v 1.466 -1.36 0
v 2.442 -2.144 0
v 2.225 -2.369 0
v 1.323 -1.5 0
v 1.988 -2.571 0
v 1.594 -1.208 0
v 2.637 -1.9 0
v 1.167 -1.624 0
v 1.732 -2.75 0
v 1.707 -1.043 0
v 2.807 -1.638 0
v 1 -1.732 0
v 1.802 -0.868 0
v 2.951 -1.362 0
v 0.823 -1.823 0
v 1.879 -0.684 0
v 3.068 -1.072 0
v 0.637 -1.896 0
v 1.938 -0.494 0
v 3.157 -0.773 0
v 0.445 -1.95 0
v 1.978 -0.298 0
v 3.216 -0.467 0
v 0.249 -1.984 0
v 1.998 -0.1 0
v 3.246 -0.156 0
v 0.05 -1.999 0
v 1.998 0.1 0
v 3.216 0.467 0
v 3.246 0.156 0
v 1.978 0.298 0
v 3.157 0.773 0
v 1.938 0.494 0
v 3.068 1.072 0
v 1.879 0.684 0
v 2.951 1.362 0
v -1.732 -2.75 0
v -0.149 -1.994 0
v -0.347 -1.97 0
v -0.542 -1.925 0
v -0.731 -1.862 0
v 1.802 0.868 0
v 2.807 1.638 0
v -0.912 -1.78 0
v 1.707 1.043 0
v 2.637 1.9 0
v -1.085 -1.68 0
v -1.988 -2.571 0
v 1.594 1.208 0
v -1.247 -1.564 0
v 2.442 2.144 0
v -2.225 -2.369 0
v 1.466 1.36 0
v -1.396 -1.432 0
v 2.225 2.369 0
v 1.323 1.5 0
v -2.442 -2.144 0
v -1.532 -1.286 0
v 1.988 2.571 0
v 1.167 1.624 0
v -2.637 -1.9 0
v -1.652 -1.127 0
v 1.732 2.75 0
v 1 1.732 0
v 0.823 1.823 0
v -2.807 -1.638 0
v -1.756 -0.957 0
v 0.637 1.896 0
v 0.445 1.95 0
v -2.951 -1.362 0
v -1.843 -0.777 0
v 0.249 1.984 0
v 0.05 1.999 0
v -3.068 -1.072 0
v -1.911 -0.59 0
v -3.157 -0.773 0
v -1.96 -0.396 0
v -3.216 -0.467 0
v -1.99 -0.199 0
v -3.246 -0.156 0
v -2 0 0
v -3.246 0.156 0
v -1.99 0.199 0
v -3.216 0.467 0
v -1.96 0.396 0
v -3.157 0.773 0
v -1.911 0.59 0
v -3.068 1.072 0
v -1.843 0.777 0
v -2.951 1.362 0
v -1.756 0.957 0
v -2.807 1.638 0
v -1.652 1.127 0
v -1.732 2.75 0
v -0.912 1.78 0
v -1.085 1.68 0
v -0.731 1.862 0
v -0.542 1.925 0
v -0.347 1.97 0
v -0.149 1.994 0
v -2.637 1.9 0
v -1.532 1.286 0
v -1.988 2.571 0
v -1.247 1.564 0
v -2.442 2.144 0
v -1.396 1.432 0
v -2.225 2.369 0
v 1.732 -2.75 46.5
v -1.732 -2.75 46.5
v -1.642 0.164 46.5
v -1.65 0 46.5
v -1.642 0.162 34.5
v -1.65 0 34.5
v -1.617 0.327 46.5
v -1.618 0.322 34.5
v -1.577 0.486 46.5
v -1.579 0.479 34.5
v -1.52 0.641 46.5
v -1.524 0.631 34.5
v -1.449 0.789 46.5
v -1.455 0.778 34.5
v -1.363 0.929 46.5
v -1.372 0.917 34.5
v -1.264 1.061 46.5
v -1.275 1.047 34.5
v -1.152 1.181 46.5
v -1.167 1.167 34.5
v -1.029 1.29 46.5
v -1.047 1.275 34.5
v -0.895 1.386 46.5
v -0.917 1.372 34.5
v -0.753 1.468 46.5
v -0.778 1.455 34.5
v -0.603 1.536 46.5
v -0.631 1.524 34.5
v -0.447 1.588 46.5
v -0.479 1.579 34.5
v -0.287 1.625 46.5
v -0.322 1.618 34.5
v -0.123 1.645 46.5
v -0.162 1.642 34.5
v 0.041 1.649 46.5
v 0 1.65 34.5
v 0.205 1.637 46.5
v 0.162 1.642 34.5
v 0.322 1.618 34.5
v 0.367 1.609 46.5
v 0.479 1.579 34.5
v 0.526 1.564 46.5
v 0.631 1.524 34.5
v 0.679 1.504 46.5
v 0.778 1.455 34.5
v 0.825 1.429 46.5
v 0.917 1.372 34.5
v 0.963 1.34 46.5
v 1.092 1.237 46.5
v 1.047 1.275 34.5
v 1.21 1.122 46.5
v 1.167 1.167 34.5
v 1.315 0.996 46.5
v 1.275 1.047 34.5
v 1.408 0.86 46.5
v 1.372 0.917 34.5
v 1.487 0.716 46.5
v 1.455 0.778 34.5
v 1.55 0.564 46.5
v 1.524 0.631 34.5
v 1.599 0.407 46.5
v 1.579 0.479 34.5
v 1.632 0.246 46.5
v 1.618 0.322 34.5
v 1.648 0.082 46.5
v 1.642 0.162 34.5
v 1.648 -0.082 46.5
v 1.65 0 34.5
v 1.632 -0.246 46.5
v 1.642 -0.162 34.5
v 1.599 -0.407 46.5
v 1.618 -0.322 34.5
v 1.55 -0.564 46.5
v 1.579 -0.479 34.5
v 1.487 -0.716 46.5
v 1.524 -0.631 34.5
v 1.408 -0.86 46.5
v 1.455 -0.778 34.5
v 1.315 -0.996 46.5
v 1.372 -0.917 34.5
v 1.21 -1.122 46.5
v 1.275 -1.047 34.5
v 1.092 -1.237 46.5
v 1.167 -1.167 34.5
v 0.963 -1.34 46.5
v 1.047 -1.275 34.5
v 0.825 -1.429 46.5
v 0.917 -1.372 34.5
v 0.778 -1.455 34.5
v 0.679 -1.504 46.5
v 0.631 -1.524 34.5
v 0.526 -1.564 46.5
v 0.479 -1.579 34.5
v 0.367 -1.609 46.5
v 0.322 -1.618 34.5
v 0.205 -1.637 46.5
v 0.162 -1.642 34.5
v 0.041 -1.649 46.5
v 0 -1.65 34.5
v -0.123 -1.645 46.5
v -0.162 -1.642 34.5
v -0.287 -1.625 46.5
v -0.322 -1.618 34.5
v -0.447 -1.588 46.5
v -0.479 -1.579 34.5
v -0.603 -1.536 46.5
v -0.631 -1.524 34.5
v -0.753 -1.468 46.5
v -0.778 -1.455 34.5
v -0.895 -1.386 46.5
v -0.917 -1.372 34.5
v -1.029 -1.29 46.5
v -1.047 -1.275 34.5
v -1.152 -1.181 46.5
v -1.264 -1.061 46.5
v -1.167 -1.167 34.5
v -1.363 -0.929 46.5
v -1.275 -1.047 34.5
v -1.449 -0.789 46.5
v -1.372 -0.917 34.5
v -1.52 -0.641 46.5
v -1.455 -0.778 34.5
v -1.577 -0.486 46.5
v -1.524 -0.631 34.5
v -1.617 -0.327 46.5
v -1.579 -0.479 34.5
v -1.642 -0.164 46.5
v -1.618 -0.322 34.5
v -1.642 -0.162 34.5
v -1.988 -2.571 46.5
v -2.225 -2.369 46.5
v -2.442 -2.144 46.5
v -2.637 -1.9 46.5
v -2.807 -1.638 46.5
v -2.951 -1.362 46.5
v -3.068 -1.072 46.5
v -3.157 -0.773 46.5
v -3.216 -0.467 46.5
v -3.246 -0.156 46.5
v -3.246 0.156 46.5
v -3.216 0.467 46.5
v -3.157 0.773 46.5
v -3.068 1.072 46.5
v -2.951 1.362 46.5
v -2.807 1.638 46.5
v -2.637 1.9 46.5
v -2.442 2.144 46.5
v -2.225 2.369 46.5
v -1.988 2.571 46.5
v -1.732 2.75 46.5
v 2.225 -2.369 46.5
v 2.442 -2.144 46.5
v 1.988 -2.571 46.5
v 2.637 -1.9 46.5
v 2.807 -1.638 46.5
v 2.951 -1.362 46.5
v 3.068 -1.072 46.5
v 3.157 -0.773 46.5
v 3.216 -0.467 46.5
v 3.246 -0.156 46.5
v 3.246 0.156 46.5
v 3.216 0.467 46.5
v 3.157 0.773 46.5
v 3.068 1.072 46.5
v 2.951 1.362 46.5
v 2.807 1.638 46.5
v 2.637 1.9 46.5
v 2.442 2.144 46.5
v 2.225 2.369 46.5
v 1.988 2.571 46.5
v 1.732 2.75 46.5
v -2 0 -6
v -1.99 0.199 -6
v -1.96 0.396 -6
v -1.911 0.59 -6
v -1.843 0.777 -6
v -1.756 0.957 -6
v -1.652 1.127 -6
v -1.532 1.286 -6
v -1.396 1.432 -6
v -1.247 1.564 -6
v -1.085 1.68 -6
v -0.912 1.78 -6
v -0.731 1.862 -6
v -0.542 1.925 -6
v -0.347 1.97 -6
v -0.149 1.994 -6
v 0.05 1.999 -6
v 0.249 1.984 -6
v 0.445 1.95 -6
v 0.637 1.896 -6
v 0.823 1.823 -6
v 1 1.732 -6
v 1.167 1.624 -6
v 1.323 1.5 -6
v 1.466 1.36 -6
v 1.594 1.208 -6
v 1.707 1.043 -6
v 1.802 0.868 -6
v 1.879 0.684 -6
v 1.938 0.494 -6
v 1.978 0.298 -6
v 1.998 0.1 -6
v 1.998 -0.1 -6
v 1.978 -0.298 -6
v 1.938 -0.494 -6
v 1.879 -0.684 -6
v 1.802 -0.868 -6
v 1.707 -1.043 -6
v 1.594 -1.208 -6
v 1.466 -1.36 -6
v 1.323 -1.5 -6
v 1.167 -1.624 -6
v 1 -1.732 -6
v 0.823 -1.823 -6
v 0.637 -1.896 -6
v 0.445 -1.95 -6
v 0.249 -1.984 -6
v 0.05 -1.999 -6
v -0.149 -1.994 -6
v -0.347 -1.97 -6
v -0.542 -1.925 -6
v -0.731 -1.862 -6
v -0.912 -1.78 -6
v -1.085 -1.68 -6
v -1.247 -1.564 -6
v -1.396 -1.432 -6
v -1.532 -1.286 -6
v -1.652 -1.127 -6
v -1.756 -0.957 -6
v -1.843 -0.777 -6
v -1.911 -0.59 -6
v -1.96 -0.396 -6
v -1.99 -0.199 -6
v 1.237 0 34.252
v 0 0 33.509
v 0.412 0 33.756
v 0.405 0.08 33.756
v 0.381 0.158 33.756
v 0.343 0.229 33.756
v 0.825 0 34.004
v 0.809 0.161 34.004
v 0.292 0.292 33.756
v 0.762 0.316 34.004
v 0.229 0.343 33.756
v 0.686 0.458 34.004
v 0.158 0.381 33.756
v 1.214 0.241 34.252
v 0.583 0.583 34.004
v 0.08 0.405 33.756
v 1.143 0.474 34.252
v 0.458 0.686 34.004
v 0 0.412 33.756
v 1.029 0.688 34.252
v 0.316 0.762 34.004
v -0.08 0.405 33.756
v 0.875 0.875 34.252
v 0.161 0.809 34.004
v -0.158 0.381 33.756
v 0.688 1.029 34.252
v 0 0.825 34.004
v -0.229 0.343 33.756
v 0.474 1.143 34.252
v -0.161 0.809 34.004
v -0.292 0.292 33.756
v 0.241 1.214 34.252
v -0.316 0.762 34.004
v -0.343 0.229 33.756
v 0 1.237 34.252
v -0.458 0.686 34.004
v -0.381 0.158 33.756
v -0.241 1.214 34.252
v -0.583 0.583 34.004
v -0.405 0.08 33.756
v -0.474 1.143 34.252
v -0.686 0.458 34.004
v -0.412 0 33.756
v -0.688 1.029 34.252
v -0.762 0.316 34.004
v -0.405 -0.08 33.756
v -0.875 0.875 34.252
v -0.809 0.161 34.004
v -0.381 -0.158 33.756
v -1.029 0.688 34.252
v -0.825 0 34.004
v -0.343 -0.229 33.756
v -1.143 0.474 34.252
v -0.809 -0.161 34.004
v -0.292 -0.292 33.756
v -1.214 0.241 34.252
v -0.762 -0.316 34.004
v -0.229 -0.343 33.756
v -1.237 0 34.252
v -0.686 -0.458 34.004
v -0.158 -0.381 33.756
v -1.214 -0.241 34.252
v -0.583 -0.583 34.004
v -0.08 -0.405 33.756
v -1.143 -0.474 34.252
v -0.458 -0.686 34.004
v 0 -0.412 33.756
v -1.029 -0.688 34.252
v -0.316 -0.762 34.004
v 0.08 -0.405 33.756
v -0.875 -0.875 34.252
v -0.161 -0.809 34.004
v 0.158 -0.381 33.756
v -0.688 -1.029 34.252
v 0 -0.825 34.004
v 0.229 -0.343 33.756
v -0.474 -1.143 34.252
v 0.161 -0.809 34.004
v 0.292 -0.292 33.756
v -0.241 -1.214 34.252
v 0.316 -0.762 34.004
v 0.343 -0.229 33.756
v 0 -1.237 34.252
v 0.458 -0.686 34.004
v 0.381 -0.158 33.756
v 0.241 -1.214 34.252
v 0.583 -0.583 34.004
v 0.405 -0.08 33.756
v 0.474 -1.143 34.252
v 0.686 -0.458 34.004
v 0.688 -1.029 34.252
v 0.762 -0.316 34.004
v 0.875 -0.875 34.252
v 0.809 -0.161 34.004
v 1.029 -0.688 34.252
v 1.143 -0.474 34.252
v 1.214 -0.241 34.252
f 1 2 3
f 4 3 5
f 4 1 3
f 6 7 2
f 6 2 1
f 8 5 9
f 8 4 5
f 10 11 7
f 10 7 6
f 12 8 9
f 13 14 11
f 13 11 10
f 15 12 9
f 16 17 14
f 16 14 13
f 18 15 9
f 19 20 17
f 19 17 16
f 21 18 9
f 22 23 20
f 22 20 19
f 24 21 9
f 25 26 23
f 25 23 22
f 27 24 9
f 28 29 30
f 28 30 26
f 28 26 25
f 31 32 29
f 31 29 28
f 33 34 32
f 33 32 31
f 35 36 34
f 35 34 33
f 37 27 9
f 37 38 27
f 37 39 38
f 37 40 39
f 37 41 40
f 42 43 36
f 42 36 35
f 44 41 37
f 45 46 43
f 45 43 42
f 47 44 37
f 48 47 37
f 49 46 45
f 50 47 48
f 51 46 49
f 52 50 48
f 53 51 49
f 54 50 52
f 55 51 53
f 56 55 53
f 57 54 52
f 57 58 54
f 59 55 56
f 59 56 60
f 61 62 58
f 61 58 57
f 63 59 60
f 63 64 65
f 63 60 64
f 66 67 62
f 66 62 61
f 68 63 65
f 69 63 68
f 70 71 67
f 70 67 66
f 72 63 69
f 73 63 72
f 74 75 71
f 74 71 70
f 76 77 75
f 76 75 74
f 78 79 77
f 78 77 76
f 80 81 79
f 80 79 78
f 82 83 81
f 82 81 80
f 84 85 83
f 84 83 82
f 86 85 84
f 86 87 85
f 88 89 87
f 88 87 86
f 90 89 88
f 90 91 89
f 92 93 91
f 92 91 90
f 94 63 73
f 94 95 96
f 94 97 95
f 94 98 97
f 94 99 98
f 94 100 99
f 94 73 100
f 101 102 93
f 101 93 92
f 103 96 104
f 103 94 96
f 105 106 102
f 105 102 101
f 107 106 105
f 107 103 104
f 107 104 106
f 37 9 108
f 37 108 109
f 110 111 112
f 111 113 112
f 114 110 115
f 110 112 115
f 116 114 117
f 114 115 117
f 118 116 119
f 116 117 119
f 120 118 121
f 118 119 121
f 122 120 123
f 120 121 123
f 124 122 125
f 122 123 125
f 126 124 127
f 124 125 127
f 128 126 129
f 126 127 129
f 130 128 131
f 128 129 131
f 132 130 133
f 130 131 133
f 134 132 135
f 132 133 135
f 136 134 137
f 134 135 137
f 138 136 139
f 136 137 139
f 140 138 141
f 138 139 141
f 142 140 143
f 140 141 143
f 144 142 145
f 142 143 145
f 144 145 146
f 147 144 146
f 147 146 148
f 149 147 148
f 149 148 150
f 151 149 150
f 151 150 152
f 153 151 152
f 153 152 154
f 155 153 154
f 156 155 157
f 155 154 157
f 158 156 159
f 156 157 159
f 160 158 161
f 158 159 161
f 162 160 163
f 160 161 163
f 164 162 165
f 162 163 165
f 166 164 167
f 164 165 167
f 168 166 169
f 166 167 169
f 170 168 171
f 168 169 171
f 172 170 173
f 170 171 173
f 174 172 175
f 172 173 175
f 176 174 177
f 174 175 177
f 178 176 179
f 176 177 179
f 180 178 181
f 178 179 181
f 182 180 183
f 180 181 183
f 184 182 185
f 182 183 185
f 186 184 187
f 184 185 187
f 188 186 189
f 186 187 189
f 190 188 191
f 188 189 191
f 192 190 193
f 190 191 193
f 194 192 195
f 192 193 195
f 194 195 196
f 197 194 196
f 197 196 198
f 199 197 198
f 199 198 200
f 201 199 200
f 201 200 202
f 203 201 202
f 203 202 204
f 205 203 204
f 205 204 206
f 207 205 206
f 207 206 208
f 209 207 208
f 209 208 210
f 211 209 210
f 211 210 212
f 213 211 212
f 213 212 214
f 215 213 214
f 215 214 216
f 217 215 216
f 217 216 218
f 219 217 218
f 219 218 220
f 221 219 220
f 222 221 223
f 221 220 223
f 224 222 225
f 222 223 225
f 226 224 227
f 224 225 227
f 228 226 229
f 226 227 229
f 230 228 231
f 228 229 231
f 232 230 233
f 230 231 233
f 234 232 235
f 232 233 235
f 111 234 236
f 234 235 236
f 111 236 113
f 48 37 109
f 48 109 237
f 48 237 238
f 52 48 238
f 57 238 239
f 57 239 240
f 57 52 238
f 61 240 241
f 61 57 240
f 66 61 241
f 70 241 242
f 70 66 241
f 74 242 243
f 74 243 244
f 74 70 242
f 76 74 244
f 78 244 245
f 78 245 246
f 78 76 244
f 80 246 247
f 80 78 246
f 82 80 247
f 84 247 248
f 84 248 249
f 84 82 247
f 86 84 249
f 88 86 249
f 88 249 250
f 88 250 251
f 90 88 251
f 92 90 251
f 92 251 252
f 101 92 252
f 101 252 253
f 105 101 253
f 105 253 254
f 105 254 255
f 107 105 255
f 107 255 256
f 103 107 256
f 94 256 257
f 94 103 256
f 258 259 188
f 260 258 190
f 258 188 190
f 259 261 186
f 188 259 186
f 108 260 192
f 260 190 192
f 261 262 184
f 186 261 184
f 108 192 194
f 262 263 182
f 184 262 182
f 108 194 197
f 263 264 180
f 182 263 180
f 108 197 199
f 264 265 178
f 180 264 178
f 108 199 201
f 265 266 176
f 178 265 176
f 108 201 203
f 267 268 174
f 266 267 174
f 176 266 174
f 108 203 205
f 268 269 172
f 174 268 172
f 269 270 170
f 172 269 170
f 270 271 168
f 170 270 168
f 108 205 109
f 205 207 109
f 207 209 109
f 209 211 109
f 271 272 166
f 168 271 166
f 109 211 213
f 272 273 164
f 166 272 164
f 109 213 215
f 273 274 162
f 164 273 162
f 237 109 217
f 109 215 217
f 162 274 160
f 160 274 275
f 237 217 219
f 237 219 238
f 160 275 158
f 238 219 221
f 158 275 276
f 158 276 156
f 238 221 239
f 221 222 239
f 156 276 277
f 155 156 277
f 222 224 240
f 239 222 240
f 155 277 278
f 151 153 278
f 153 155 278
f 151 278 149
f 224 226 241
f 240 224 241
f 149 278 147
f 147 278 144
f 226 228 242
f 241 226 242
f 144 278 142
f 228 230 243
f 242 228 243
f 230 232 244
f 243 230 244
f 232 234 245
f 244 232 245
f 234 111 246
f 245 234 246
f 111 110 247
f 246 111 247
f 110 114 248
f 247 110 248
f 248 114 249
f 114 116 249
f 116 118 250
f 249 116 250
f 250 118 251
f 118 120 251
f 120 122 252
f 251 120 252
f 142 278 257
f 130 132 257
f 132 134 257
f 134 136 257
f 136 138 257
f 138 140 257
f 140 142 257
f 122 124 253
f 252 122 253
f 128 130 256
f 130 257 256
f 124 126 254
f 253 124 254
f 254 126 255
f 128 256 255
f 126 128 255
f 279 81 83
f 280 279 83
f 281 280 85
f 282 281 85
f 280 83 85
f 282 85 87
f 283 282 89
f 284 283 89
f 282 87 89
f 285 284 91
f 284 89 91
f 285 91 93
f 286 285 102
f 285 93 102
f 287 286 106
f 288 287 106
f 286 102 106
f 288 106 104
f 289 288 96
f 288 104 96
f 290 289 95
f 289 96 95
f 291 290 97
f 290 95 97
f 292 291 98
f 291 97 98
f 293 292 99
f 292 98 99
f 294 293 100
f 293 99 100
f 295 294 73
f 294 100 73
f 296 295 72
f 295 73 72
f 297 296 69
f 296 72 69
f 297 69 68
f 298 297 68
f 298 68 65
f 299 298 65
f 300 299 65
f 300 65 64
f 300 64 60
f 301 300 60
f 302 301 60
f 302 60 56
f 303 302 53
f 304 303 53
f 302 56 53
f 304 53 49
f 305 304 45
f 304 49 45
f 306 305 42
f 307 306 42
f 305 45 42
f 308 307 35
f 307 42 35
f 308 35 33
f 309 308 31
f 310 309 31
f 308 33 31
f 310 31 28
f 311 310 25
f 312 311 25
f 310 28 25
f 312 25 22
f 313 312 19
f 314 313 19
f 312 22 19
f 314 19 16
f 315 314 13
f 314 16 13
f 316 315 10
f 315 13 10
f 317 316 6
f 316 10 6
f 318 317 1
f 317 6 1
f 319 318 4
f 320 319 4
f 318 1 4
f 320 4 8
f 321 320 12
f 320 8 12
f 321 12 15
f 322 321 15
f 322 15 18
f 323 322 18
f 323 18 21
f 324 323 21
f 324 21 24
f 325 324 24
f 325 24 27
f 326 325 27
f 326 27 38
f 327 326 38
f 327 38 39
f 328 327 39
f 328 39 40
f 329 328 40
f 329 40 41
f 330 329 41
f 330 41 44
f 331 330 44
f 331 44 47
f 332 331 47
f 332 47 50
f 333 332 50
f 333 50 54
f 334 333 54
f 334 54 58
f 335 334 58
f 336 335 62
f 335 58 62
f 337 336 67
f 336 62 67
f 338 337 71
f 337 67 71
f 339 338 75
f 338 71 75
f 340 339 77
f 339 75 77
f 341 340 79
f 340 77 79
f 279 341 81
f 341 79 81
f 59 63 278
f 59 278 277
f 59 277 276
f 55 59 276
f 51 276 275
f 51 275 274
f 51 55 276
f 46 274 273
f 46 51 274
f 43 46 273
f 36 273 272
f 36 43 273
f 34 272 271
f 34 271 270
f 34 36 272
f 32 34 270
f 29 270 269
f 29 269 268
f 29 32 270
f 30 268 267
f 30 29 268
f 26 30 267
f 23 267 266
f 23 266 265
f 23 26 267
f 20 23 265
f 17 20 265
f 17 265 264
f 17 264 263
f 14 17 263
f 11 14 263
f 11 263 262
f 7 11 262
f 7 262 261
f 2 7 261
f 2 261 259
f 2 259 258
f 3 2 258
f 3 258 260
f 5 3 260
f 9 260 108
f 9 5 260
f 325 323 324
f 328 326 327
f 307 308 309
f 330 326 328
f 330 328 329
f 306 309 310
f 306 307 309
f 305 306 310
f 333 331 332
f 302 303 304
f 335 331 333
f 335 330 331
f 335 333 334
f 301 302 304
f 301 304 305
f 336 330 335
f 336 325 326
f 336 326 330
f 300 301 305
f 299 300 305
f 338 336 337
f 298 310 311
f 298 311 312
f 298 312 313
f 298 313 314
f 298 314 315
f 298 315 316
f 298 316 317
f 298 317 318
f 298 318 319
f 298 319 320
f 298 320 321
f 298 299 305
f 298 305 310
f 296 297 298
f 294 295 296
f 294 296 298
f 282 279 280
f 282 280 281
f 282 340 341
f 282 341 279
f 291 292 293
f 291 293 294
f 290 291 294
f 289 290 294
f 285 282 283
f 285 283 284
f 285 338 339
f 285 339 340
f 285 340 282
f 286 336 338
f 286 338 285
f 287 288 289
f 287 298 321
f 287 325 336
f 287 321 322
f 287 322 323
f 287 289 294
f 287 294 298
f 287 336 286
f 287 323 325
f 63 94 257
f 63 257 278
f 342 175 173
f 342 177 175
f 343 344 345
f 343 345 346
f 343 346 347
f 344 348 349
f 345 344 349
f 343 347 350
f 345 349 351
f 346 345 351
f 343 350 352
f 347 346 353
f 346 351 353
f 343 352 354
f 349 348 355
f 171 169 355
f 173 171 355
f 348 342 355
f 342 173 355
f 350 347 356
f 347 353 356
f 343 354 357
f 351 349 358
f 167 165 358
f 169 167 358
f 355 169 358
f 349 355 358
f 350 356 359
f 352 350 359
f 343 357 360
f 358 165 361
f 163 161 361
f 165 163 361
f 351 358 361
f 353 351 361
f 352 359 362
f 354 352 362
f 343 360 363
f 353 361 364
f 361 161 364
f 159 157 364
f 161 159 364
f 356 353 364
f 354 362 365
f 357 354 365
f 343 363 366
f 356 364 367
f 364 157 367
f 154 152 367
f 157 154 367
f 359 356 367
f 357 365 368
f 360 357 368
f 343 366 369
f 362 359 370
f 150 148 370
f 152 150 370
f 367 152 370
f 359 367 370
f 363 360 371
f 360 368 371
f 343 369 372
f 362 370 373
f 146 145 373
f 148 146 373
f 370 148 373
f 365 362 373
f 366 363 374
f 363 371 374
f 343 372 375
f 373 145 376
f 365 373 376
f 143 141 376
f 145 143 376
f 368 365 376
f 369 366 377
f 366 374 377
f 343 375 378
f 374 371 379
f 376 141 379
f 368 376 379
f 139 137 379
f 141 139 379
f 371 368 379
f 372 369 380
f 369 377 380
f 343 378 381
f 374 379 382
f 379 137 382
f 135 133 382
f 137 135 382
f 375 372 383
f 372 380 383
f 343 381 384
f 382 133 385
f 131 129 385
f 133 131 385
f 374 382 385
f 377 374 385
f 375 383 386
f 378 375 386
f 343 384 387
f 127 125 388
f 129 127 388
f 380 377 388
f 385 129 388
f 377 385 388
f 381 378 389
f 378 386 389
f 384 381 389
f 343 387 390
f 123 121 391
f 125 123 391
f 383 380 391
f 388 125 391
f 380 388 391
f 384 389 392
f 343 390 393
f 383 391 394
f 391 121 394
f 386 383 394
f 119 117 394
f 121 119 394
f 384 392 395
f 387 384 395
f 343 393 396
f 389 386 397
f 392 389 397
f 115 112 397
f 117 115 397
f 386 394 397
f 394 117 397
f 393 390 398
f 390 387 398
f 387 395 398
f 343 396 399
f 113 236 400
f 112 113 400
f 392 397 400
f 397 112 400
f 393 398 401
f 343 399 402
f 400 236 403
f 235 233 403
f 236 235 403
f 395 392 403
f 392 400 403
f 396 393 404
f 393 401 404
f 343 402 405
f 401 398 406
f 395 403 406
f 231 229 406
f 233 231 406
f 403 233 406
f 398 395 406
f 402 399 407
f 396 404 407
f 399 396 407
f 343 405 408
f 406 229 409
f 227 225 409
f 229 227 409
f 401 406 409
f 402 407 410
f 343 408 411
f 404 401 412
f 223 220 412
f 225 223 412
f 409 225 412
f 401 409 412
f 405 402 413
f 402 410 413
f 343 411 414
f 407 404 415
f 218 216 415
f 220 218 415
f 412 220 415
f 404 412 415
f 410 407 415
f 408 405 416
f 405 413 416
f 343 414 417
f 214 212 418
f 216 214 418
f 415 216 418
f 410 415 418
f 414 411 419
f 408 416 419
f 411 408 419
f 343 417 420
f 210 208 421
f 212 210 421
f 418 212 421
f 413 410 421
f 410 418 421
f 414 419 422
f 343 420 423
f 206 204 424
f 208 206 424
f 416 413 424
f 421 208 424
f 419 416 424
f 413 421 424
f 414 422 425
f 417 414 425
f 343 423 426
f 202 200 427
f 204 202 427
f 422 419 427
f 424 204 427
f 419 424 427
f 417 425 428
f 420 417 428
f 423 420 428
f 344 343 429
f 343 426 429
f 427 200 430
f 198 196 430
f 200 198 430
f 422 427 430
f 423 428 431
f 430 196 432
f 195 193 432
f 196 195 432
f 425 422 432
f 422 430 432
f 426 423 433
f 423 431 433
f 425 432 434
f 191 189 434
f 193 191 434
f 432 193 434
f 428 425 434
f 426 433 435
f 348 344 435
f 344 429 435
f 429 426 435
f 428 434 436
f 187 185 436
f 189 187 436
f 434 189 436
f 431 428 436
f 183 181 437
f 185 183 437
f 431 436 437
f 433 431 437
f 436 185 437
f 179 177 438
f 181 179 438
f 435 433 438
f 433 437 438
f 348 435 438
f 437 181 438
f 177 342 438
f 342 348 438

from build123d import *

# Parameters (mm, degrees)
EXTRUDE_1_DEPTH        = 46.5
HOLE_WIZARD_M4_1_D     = 3.3
HOLE_WIZARD_M4_1_DEPTH = 12
HOLE_WIZARD_M4_1_TIP   = 0.991420021
SKETCH_4_R             = 2
EXTRUDE_2_DEPTH        = 6


with BuildPart() as part:
    # 草图1 → 凸台-拉伸1 (new body)
    with BuildSketch(Plane.XY):
        with BuildLine():
            Line((-1.732050808, 2.75), (1.732050808, 2.75))
            ThreePointArc((1.732050808, 2.75), (3.25, 0), (1.732050808, -2.75))
            Line((1.732050808, -2.75), (-1.732050808, -2.75))
            ThreePointArc((-1.732050808, -2.75), (-3.25, 0), (-1.732050808, 2.75))
        make_face()
    extrude(amount=EXTRUDE_1_DEPTH)

    # M4 螺纹孔1
    with Locations(Plane.XY.offset(46.5)):
        with Locations((0, 0)):
            Hole(HOLE_WIZARD_M4_1_D / 2, depth=HOLE_WIZARD_M4_1_DEPTH)
            with Locations((0, 0, -(HOLE_WIZARD_M4_1_DEPTH + HOLE_WIZARD_M4_1_TIP / 2))):  # 118° drill point
                Cone(0, HOLE_WIZARD_M4_1_D / 2, HOLE_WIZARD_M4_1_TIP, mode=Mode.SUBTRACT)

    # 草图4 → 凸台-拉伸2 (add)
    with BuildSketch(Plane(origin=(0, 0, 0), x_dir=(-1, 0, 0), z_dir=(0, 0, -1))):
        Circle(SKETCH_4_R)
    extrude(amount=EXTRUDE_2_DEPTH)


solid = part.part
